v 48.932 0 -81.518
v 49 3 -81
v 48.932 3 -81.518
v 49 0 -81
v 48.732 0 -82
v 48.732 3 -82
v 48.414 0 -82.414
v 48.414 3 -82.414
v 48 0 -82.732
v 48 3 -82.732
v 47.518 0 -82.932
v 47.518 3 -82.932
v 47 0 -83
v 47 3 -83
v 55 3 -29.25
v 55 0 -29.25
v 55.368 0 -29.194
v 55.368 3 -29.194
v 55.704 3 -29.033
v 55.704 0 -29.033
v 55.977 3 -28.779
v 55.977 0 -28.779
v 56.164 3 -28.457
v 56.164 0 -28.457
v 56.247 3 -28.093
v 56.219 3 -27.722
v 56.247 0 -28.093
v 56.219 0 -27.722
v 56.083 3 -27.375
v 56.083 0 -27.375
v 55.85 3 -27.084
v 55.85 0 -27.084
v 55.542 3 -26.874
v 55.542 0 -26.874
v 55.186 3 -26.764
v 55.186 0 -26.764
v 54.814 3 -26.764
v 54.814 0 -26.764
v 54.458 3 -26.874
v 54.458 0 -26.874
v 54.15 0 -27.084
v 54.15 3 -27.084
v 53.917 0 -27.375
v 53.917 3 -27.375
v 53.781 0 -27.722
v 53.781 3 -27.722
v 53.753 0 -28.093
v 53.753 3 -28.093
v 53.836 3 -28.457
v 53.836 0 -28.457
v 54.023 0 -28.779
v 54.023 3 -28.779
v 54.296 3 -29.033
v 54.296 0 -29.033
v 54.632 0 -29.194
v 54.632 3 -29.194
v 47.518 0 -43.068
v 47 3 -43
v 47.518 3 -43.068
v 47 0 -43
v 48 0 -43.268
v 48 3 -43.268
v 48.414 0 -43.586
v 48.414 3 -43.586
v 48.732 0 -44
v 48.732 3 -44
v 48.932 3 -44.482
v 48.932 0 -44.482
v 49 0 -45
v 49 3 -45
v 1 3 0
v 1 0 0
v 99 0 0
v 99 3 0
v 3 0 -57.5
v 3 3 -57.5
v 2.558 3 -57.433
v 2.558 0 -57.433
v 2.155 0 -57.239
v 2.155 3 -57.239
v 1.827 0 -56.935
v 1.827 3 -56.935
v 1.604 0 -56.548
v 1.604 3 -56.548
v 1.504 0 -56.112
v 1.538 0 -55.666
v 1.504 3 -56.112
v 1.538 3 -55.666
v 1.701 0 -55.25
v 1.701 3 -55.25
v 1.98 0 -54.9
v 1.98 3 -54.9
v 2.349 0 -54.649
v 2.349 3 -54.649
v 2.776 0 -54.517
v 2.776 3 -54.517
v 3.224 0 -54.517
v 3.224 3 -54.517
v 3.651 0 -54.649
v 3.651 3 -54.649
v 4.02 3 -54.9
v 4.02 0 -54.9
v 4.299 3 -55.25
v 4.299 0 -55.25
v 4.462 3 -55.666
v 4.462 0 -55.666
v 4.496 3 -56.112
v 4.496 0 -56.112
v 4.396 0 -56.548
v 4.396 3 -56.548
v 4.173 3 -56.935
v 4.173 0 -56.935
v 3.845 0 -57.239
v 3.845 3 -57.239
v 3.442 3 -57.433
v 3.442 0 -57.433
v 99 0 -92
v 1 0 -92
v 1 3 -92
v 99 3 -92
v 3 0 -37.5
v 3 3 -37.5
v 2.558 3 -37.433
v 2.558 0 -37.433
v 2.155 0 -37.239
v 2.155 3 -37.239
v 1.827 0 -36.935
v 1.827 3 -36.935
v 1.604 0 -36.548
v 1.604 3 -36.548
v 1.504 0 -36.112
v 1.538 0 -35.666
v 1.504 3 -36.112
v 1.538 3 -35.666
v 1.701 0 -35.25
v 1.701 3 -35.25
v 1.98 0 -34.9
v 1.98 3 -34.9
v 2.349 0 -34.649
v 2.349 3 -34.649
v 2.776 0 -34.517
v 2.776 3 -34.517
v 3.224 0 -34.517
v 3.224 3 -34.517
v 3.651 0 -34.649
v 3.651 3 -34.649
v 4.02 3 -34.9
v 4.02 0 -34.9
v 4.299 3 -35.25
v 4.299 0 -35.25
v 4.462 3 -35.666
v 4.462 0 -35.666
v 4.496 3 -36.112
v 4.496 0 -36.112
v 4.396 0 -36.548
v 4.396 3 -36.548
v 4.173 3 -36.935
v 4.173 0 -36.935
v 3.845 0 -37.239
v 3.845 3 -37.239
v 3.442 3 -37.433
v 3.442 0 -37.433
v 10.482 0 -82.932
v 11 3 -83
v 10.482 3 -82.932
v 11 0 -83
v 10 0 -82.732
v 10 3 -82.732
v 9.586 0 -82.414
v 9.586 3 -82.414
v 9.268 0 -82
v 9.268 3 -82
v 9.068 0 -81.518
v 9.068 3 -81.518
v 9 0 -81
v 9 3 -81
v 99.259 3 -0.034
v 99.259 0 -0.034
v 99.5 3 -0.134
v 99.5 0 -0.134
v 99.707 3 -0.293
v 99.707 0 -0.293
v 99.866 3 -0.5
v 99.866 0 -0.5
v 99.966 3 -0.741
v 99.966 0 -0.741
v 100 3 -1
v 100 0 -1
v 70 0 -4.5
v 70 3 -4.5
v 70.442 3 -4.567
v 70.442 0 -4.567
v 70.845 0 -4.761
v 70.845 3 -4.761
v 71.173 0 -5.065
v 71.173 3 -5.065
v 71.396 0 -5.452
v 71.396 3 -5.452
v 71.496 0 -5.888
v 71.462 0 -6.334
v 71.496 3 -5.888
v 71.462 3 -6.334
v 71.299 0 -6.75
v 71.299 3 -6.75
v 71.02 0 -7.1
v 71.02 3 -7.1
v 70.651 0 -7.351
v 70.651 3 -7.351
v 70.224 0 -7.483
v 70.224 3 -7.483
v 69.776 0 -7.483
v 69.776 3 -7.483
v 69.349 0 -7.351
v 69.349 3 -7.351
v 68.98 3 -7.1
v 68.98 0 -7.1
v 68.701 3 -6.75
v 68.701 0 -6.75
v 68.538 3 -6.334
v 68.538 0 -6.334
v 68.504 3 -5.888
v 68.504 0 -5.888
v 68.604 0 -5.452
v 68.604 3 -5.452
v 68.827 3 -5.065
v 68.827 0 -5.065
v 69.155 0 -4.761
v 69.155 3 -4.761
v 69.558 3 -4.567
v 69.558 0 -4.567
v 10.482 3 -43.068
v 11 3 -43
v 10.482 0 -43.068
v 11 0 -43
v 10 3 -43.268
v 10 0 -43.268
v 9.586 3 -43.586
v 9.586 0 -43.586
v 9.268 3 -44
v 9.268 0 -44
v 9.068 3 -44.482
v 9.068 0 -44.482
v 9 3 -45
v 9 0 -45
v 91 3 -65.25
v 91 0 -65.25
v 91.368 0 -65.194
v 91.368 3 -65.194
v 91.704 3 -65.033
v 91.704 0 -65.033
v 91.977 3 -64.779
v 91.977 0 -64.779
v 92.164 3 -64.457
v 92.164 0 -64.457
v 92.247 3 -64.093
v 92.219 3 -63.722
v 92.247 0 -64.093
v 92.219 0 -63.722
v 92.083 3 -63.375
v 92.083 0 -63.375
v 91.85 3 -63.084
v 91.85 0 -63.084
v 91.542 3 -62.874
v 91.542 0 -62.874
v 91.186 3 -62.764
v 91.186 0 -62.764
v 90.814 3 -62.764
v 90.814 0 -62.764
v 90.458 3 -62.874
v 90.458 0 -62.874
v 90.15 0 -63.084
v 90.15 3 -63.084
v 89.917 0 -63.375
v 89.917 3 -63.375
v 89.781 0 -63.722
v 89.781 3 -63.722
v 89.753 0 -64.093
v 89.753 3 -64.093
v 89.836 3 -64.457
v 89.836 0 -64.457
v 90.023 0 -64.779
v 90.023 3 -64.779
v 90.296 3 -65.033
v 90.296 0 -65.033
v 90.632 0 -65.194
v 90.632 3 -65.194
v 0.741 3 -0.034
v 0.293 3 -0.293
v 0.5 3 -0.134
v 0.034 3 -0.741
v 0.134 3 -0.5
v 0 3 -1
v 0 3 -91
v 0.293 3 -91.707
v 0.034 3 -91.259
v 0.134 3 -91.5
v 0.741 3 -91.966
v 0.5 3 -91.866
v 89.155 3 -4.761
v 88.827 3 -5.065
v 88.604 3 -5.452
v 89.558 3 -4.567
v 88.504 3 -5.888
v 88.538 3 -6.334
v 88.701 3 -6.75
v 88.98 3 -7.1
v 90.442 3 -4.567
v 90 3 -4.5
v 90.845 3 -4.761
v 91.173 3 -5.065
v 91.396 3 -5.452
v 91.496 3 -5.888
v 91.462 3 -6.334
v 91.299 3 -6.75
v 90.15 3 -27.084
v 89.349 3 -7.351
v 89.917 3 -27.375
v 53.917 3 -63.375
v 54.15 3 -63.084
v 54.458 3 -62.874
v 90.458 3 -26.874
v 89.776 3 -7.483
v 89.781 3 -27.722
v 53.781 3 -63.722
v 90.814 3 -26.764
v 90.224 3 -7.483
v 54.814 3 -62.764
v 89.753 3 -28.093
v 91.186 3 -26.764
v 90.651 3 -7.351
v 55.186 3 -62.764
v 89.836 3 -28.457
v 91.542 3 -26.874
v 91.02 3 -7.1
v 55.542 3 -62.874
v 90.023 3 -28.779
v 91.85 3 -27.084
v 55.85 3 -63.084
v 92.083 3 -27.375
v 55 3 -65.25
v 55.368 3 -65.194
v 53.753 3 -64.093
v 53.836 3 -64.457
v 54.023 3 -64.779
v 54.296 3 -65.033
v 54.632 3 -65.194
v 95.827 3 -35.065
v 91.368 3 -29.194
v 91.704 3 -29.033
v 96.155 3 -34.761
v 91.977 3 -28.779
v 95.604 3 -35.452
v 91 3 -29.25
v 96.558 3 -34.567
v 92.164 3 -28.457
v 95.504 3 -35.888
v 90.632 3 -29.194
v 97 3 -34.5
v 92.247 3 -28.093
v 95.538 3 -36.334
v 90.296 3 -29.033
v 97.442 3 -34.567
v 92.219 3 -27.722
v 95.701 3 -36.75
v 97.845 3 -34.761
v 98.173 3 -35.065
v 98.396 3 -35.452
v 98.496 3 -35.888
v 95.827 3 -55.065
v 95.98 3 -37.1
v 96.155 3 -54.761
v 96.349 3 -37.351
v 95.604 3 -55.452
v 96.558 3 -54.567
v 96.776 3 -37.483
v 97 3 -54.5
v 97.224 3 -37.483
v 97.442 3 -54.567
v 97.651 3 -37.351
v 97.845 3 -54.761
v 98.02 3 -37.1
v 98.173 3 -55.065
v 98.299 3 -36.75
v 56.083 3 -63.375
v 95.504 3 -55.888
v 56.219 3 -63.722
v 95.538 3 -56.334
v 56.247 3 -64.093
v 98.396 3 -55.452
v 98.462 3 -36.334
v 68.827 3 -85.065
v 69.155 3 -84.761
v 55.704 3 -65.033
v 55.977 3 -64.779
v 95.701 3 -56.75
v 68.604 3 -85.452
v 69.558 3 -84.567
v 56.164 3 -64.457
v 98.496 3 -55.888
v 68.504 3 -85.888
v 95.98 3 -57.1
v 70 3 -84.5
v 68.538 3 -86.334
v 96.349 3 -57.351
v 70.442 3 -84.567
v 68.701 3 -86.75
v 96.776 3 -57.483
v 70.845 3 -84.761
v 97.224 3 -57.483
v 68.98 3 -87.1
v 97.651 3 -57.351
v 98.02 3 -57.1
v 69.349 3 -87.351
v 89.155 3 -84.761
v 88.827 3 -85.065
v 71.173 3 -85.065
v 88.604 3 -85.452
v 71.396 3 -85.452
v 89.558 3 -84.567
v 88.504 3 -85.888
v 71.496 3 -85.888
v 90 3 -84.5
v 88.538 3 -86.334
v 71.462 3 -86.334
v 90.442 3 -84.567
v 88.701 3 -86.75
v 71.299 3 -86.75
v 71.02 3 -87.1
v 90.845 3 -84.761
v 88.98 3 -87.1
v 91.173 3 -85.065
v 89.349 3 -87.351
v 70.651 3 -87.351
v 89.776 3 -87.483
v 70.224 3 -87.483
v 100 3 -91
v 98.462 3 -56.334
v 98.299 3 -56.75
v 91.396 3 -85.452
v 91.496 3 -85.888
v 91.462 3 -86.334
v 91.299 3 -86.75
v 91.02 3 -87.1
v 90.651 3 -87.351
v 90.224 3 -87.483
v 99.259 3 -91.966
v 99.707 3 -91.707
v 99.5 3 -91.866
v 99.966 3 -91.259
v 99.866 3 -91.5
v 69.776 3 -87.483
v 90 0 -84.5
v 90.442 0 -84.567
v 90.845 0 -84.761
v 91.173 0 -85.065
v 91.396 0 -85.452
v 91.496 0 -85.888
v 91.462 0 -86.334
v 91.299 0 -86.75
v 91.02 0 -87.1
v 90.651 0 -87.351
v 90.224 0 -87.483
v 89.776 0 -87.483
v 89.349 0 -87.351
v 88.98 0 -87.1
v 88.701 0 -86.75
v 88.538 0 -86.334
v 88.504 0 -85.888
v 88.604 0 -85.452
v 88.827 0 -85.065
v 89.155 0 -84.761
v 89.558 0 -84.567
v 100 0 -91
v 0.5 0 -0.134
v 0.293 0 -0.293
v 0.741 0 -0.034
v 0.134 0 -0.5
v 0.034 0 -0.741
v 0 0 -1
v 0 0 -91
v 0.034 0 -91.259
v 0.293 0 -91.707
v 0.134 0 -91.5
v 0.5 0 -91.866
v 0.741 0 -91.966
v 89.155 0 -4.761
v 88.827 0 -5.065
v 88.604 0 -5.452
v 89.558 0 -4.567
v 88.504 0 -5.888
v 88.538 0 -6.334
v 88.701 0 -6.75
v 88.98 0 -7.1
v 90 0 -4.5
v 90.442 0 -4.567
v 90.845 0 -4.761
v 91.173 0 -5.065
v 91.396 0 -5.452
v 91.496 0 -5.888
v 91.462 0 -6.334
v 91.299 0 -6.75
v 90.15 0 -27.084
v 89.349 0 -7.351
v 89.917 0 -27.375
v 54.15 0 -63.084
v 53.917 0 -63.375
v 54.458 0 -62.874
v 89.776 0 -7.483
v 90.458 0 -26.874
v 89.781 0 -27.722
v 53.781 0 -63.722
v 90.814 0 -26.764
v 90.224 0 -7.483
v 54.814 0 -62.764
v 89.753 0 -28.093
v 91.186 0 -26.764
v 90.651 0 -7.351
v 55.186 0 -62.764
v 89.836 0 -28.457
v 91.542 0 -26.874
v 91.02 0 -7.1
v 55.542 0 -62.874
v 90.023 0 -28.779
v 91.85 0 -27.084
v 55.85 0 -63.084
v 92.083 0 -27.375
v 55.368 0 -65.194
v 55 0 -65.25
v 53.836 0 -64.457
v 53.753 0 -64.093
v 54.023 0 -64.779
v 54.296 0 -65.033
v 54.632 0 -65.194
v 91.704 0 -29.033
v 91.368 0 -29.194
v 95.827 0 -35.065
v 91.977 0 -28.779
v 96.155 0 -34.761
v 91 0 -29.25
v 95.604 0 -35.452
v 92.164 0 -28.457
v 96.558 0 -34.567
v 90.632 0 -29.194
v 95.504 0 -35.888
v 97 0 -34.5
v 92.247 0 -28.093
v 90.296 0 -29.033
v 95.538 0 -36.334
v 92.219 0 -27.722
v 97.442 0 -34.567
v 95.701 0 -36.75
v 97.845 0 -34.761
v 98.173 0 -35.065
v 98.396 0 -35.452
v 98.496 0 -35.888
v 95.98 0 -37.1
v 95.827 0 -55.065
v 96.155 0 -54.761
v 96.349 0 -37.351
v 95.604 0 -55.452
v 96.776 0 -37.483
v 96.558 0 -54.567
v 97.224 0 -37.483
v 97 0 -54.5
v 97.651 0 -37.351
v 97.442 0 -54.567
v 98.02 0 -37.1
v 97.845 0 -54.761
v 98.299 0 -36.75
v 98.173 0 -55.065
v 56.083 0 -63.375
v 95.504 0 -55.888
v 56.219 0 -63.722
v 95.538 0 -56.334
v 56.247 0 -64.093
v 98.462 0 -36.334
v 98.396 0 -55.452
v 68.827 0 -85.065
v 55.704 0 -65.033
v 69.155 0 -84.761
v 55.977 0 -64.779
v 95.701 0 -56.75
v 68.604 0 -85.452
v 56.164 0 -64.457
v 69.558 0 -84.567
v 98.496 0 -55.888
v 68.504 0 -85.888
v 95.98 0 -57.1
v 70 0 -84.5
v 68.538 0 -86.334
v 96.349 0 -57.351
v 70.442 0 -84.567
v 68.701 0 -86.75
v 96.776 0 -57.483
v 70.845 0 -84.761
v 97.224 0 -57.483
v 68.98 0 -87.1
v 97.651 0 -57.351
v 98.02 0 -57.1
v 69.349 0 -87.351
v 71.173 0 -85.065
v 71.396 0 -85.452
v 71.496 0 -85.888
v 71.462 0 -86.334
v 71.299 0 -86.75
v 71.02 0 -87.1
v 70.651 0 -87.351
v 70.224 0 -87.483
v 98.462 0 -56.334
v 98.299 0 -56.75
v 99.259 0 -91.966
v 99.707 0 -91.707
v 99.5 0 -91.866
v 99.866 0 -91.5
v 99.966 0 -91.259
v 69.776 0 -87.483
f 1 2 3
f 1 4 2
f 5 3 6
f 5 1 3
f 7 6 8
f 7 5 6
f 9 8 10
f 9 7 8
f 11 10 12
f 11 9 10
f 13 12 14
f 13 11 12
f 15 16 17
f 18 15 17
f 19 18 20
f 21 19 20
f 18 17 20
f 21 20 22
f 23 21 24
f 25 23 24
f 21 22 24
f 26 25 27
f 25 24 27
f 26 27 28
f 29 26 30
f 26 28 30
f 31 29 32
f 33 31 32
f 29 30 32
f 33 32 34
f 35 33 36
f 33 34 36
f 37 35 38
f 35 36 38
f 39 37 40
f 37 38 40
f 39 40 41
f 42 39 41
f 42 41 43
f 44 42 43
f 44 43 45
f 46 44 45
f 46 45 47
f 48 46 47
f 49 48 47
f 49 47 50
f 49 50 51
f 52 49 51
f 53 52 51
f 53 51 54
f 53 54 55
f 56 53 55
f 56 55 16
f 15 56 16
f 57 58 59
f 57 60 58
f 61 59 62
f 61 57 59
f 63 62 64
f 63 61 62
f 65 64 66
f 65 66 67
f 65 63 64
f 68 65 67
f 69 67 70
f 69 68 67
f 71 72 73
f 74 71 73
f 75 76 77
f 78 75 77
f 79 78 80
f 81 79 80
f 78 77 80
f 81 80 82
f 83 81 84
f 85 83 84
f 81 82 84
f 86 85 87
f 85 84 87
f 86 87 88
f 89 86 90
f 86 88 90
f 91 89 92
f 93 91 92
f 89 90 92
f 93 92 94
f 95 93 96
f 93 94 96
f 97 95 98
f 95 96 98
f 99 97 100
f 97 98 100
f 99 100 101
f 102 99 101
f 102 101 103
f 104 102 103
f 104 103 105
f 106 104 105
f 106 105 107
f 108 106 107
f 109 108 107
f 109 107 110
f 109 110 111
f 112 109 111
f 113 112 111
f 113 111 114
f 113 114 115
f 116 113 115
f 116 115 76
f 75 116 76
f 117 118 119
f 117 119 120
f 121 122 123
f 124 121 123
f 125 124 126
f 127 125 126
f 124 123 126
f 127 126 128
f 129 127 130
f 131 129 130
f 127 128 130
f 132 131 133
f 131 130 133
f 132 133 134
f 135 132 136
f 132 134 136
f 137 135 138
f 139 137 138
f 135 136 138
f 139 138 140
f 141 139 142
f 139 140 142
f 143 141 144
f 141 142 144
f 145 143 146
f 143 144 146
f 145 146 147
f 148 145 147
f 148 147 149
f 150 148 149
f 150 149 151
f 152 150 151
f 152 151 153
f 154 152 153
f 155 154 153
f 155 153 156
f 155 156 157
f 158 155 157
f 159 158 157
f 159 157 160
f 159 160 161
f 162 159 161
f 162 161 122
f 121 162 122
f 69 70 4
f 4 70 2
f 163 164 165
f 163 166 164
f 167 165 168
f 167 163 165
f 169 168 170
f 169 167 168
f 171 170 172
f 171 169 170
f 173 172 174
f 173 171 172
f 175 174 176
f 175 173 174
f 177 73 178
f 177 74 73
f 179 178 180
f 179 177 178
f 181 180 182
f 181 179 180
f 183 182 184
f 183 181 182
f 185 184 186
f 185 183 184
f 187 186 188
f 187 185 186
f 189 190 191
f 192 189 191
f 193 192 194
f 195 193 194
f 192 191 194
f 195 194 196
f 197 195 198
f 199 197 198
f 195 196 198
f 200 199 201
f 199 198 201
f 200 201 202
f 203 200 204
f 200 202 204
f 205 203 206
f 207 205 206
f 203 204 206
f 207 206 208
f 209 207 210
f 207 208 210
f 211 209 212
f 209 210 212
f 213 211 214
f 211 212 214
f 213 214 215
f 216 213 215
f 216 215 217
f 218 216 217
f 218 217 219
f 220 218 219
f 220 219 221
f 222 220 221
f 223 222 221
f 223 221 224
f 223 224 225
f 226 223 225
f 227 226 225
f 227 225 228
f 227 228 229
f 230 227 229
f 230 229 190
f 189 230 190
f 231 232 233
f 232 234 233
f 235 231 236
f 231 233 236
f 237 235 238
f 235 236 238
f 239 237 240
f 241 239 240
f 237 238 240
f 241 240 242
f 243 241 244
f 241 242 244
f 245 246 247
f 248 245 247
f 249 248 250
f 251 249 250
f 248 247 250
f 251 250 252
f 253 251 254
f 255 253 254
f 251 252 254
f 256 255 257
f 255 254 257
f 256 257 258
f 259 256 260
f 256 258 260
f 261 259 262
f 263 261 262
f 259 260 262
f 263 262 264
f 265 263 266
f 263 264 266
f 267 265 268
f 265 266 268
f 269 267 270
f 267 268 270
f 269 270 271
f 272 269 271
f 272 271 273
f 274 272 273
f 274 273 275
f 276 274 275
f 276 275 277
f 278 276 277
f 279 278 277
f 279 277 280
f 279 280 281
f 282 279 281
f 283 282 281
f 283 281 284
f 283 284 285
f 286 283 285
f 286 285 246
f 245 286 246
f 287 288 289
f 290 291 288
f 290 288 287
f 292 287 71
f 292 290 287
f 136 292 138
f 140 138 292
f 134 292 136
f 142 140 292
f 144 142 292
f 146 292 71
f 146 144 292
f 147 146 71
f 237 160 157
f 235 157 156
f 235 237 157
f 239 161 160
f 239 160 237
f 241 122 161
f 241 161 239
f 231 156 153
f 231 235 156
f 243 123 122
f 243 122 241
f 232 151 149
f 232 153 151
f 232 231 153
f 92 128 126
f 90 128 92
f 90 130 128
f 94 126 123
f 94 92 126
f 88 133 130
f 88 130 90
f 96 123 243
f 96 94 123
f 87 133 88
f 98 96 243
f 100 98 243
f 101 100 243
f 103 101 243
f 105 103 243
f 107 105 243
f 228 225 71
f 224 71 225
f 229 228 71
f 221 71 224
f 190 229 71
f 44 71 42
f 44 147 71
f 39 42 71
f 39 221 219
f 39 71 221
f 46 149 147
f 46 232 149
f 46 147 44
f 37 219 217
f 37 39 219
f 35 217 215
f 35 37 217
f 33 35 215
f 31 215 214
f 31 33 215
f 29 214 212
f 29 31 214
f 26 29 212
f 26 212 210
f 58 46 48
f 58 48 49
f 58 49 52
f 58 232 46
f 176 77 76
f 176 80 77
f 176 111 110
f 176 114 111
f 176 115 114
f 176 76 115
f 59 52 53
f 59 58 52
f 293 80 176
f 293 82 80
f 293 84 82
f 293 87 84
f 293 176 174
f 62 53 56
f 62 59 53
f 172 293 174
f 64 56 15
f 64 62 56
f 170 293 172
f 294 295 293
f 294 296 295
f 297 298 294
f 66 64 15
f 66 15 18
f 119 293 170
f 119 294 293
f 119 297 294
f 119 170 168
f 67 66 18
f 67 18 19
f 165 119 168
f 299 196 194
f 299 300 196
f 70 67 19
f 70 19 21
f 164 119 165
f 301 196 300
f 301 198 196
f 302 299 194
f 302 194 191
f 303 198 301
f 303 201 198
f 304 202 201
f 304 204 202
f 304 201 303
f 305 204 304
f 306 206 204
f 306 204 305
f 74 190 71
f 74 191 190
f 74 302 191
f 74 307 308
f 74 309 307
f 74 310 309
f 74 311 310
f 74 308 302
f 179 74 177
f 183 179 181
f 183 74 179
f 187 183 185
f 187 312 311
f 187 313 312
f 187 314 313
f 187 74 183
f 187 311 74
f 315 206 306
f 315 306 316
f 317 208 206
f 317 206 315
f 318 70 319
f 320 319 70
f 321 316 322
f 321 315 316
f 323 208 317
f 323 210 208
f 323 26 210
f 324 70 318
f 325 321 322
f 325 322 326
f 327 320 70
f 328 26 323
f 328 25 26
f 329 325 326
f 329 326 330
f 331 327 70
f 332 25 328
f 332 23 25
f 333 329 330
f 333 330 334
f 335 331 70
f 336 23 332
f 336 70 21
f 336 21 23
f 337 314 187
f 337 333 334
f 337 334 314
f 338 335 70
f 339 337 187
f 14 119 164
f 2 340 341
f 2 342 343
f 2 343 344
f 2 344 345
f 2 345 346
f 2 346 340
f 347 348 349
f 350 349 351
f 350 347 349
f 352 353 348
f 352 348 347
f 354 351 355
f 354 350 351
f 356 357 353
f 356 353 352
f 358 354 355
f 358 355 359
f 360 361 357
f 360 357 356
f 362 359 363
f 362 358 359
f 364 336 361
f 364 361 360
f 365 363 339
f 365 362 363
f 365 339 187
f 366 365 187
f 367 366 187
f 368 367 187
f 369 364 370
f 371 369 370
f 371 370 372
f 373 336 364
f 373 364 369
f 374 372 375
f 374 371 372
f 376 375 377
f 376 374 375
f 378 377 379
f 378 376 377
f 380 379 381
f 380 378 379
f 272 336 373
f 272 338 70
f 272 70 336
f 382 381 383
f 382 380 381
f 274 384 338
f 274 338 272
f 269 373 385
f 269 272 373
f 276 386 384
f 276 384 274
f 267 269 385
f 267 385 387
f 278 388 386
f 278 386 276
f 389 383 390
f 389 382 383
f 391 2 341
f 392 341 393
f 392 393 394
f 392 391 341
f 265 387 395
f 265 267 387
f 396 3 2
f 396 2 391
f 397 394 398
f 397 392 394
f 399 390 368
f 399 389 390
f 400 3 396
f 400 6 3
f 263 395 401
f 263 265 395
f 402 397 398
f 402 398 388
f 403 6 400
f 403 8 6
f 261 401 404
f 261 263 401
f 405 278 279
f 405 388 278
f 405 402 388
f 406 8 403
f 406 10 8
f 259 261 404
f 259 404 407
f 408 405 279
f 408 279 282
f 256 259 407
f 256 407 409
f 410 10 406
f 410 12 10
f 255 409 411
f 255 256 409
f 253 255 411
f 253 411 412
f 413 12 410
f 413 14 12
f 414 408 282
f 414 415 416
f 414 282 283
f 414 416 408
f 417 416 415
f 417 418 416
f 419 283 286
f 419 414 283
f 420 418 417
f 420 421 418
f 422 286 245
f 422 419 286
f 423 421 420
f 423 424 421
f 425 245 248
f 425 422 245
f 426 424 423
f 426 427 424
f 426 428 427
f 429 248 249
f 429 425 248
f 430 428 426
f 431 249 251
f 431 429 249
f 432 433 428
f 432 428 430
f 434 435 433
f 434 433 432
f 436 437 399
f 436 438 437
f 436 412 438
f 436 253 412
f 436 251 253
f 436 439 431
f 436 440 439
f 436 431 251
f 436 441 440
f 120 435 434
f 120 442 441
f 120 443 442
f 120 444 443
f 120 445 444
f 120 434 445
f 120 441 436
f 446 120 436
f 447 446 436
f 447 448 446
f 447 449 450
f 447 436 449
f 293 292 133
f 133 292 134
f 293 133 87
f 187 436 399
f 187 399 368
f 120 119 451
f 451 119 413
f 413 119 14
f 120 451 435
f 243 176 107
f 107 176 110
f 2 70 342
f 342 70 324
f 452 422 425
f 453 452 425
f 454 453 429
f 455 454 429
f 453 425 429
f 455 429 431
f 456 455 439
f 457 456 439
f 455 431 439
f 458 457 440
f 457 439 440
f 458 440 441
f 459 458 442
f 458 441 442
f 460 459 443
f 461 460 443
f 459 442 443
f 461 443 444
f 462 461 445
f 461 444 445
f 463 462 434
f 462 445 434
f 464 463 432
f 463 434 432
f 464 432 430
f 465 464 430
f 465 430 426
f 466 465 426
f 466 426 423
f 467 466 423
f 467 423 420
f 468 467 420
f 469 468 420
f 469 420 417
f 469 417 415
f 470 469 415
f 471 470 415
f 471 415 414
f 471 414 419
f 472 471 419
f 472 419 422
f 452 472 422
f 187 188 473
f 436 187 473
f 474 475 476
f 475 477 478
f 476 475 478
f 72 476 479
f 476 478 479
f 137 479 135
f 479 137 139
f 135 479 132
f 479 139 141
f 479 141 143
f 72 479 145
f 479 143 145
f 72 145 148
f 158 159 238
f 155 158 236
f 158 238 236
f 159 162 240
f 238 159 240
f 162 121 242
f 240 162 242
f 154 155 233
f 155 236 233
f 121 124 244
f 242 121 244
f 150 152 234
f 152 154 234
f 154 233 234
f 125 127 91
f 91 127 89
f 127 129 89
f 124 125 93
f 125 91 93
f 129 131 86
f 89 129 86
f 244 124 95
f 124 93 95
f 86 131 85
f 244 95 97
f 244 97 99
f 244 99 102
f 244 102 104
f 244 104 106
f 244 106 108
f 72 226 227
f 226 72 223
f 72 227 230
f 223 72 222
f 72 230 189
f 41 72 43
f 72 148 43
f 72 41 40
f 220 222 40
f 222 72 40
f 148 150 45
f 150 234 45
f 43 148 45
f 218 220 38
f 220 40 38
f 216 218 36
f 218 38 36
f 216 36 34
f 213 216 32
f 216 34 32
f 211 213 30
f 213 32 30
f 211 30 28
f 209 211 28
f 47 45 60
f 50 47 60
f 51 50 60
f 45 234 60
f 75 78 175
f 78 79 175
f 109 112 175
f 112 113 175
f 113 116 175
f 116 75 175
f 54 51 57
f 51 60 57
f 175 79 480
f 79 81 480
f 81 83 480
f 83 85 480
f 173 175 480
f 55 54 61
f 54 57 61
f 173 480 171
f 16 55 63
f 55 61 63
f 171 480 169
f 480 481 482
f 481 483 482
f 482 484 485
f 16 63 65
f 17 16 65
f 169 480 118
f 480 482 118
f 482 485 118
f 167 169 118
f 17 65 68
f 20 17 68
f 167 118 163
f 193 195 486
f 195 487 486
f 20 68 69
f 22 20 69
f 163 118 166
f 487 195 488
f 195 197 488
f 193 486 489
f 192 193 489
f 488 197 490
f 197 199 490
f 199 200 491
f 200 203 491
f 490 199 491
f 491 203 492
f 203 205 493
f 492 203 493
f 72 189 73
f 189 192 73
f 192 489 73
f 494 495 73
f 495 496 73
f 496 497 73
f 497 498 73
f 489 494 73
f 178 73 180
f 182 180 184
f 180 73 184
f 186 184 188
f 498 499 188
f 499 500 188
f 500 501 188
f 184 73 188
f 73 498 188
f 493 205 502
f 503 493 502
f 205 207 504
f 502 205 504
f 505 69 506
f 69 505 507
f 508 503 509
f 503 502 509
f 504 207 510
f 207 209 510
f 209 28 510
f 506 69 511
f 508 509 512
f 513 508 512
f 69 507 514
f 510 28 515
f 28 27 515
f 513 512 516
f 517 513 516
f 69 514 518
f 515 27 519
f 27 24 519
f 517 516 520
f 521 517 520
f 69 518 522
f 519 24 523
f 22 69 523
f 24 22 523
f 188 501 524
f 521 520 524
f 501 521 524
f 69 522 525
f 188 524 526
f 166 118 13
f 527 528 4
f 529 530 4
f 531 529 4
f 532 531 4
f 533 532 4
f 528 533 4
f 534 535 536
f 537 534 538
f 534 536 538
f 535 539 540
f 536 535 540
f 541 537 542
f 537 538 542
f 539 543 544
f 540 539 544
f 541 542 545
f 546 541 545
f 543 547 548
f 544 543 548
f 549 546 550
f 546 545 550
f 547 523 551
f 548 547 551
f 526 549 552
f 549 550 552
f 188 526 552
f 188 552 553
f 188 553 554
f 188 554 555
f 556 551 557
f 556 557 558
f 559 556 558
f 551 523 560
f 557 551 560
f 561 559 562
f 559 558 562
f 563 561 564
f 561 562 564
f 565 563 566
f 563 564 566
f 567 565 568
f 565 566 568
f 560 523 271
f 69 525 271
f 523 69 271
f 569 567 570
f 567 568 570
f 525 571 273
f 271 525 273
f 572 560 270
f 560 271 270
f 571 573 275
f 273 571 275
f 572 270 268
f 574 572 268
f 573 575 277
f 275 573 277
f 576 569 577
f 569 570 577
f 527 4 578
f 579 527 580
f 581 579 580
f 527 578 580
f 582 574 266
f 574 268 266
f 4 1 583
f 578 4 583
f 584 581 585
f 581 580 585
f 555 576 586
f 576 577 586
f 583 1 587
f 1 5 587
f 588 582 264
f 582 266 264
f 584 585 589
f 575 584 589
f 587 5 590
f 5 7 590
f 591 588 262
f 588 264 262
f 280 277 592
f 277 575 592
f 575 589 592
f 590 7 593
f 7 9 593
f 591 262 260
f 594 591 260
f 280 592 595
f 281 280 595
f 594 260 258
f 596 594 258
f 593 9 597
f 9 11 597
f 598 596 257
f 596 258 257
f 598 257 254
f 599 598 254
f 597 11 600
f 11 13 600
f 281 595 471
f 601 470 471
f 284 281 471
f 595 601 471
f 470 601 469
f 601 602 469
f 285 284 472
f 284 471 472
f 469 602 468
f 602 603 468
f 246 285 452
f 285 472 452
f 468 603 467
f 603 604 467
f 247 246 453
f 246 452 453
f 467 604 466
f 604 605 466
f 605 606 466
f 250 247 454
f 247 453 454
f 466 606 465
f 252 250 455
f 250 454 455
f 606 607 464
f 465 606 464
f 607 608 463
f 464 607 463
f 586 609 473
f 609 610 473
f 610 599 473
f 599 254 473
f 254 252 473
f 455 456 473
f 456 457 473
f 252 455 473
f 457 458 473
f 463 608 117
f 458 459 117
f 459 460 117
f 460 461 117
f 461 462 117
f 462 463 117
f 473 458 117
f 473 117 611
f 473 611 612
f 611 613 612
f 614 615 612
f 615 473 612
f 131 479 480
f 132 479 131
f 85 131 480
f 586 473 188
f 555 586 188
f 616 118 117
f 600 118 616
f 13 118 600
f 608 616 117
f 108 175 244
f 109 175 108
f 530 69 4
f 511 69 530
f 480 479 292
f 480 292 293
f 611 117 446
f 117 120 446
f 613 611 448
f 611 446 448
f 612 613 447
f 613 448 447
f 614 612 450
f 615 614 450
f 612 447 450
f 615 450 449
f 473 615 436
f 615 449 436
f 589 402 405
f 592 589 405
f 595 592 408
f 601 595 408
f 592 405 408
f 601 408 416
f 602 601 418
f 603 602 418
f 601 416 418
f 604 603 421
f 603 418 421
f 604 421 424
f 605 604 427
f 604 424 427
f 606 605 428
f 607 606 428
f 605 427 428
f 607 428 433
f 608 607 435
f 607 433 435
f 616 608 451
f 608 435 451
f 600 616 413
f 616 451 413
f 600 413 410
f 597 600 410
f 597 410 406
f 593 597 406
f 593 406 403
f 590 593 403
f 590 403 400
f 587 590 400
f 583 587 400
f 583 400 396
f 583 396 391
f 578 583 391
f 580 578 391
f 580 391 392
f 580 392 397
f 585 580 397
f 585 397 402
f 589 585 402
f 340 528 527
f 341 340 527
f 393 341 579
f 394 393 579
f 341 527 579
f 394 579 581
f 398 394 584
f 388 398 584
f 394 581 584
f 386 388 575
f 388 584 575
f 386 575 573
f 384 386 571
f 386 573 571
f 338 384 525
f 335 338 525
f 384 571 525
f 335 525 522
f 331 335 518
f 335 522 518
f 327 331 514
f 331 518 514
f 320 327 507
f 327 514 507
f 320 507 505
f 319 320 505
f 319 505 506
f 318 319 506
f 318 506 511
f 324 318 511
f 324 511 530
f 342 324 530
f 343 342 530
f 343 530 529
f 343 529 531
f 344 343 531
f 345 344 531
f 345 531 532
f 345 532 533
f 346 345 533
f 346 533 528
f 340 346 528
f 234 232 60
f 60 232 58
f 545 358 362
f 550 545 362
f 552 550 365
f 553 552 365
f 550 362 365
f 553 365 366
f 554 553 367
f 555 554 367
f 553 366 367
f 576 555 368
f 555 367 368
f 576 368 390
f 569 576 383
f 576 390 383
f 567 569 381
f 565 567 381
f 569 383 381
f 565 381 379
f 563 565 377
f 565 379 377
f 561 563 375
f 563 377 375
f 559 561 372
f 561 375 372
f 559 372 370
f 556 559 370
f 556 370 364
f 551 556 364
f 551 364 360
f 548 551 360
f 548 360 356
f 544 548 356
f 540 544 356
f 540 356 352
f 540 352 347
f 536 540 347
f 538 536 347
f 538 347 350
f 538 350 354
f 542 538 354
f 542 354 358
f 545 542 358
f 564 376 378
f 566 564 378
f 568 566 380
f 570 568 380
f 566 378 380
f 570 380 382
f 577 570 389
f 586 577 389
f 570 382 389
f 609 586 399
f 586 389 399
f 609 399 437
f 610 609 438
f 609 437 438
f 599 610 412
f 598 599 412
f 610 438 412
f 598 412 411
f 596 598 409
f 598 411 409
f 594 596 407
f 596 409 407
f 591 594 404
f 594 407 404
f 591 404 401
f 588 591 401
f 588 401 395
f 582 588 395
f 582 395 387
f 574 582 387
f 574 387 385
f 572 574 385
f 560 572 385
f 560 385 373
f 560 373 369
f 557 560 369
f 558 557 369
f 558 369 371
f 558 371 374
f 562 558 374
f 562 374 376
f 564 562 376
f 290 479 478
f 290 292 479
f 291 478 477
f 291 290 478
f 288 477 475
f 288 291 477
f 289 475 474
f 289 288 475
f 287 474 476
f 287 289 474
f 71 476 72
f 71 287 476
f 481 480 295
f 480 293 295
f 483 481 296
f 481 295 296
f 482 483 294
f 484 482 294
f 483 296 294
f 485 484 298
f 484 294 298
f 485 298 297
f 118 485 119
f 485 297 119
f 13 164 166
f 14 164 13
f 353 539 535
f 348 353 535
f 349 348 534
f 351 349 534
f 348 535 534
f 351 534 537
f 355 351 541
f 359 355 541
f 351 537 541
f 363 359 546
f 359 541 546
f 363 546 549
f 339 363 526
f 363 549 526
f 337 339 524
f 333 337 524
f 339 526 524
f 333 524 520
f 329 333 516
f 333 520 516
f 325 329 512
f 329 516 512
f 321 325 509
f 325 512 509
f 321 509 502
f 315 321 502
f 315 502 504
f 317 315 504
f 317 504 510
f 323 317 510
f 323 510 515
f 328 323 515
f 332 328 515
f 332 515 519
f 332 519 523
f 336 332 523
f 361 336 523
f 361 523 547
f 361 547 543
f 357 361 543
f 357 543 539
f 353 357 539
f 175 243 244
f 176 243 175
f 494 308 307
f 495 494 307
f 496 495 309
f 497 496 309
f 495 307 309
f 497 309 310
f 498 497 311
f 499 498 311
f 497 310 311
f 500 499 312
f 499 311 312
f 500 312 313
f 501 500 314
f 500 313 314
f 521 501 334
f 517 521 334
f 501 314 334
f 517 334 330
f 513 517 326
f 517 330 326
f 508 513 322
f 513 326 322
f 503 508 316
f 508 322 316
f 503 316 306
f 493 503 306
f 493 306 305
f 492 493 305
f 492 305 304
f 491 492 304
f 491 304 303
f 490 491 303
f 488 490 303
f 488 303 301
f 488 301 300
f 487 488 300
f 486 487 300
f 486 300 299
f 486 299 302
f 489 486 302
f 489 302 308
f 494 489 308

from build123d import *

# Parameters (mm, degrees)
SKETCH_1_W          = 100
SKETCH_1_H          = 92
EXTRUDE_1_DEPTH     = 3
SKETCH_2_R          = 1.5
CUT_EXTRUDE_1_DEPTH = 136.915414873
SKETCH_3_W          = 40
SKETCH_3_H          = 40
CUT_EXTRUDE_2_DEPTH = 10
FILLET_1_R          = 2
FILLET_2_R          = 1
SKETCH_4_R          = 1.25
CUT_EXTRUDE_3_DEPTH = 10


with BuildPart() as part:
    # 草图1 → 凸台-拉伸1 (new body)
    with BuildSketch(Plane(origin=(0, 0, 0), x_dir=(1, 0, 0), z_dir=(0, 1, 0))):
        with Locations((50, 46)):
            Rectangle(SKETCH_1_W, SKETCH_1_H)
    extrude(amount=EXTRUDE_1_DEPTH)

    # 草图2 → 切除-拉伸1 (cut, through all)
    with BuildSketch(Plane(origin=(0, 3, 0), x_dir=(1, 0, 0), z_dir=(0, 1, 0))):
        with Locations(Location((90, 86, 0), (0, 0, 270))):
            Circle(SKETCH_2_R)
        with Locations(Location((70, 86, 0), (0, 0, 270))):
            Circle(SKETCH_2_R)
        with Locations(Location((70, 6, 0), (0, 0, 270))):
            Circle(SKETCH_2_R)
        with Locations(Location((90, 6, 0), (0, 0, 270))):
            Circle(SKETCH_2_R)
        with Locations(Location((97, 56, 0), (0, 0, 270))):
            Circle(SKETCH_2_R)
        with Locations(Location((97, 36, 0), (0, 0, 270))):
            Circle(SKETCH_2_R)
        with Locations(Location((3, 36, 0), (0, 0, 90))):
            Circle(SKETCH_2_R)
        with Locations(Location((3, 56, 0), (0, 0, 90))):
            Circle(SKETCH_2_R)
    extrude(amount=-CUT_EXTRUDE_1_DEPTH, mode=Mode.SUBTRACT)

    # 草图3 → 切除-拉伸2 (cut)
    with BuildSketch(Plane(origin=(0, 3, 0), x_dir=(1, 0, 0), z_dir=(0, 1, 0))):
        with Locations((29, 63)):
            Rectangle(SKETCH_3_W, SKETCH_3_H)
    extrude(amount=-CUT_EXTRUDE_2_DEPTH, mode=Mode.SUBTRACT)

    # 圆角1
    fillet_1_edges = [part.edges().sort_by_distance(p)[0] for p in [
        (49, 1.5, -43),
        (9, 1.5, -43),
        (9, 1.5, -83),
        (49, 1.5, -83),
    ]]
    fillet(fillet_1_edges, radius=FILLET_1_R)

    # 圆角2
    fillet_2_edges = [part.edges().sort_by_distance(p)[0] for p in [
        (0, 1.5, -92),
        (100, 1.5, -92),
        (100, 1.5, 0),
        (0, 1.5, 0),
    ]]
    fillet(fillet_2_edges, radius=FILLET_2_R)

    # 草图4 → 切除-拉伸3 (cut)
    with BuildSketch(Plane.XZ):
        with Locations(Location((55, -28, 0), (0, 0, 270))):
            Circle(SKETCH_4_R)
        with Locations(Location((91, -28, 0), (0, 0, 270))):
            Circle(SKETCH_4_R)
        with Locations(Location((55, -64, 0), (0, 0, 270))):
            Circle(SKETCH_4_R)
        with Locations(Location((91, -64, 0), (0, 0, 270))):
            Circle(SKETCH_4_R)
    extrude(amount=-CUT_EXTRUDE_3_DEPTH, mode=Mode.SUBTRACT)


solid = part.part
